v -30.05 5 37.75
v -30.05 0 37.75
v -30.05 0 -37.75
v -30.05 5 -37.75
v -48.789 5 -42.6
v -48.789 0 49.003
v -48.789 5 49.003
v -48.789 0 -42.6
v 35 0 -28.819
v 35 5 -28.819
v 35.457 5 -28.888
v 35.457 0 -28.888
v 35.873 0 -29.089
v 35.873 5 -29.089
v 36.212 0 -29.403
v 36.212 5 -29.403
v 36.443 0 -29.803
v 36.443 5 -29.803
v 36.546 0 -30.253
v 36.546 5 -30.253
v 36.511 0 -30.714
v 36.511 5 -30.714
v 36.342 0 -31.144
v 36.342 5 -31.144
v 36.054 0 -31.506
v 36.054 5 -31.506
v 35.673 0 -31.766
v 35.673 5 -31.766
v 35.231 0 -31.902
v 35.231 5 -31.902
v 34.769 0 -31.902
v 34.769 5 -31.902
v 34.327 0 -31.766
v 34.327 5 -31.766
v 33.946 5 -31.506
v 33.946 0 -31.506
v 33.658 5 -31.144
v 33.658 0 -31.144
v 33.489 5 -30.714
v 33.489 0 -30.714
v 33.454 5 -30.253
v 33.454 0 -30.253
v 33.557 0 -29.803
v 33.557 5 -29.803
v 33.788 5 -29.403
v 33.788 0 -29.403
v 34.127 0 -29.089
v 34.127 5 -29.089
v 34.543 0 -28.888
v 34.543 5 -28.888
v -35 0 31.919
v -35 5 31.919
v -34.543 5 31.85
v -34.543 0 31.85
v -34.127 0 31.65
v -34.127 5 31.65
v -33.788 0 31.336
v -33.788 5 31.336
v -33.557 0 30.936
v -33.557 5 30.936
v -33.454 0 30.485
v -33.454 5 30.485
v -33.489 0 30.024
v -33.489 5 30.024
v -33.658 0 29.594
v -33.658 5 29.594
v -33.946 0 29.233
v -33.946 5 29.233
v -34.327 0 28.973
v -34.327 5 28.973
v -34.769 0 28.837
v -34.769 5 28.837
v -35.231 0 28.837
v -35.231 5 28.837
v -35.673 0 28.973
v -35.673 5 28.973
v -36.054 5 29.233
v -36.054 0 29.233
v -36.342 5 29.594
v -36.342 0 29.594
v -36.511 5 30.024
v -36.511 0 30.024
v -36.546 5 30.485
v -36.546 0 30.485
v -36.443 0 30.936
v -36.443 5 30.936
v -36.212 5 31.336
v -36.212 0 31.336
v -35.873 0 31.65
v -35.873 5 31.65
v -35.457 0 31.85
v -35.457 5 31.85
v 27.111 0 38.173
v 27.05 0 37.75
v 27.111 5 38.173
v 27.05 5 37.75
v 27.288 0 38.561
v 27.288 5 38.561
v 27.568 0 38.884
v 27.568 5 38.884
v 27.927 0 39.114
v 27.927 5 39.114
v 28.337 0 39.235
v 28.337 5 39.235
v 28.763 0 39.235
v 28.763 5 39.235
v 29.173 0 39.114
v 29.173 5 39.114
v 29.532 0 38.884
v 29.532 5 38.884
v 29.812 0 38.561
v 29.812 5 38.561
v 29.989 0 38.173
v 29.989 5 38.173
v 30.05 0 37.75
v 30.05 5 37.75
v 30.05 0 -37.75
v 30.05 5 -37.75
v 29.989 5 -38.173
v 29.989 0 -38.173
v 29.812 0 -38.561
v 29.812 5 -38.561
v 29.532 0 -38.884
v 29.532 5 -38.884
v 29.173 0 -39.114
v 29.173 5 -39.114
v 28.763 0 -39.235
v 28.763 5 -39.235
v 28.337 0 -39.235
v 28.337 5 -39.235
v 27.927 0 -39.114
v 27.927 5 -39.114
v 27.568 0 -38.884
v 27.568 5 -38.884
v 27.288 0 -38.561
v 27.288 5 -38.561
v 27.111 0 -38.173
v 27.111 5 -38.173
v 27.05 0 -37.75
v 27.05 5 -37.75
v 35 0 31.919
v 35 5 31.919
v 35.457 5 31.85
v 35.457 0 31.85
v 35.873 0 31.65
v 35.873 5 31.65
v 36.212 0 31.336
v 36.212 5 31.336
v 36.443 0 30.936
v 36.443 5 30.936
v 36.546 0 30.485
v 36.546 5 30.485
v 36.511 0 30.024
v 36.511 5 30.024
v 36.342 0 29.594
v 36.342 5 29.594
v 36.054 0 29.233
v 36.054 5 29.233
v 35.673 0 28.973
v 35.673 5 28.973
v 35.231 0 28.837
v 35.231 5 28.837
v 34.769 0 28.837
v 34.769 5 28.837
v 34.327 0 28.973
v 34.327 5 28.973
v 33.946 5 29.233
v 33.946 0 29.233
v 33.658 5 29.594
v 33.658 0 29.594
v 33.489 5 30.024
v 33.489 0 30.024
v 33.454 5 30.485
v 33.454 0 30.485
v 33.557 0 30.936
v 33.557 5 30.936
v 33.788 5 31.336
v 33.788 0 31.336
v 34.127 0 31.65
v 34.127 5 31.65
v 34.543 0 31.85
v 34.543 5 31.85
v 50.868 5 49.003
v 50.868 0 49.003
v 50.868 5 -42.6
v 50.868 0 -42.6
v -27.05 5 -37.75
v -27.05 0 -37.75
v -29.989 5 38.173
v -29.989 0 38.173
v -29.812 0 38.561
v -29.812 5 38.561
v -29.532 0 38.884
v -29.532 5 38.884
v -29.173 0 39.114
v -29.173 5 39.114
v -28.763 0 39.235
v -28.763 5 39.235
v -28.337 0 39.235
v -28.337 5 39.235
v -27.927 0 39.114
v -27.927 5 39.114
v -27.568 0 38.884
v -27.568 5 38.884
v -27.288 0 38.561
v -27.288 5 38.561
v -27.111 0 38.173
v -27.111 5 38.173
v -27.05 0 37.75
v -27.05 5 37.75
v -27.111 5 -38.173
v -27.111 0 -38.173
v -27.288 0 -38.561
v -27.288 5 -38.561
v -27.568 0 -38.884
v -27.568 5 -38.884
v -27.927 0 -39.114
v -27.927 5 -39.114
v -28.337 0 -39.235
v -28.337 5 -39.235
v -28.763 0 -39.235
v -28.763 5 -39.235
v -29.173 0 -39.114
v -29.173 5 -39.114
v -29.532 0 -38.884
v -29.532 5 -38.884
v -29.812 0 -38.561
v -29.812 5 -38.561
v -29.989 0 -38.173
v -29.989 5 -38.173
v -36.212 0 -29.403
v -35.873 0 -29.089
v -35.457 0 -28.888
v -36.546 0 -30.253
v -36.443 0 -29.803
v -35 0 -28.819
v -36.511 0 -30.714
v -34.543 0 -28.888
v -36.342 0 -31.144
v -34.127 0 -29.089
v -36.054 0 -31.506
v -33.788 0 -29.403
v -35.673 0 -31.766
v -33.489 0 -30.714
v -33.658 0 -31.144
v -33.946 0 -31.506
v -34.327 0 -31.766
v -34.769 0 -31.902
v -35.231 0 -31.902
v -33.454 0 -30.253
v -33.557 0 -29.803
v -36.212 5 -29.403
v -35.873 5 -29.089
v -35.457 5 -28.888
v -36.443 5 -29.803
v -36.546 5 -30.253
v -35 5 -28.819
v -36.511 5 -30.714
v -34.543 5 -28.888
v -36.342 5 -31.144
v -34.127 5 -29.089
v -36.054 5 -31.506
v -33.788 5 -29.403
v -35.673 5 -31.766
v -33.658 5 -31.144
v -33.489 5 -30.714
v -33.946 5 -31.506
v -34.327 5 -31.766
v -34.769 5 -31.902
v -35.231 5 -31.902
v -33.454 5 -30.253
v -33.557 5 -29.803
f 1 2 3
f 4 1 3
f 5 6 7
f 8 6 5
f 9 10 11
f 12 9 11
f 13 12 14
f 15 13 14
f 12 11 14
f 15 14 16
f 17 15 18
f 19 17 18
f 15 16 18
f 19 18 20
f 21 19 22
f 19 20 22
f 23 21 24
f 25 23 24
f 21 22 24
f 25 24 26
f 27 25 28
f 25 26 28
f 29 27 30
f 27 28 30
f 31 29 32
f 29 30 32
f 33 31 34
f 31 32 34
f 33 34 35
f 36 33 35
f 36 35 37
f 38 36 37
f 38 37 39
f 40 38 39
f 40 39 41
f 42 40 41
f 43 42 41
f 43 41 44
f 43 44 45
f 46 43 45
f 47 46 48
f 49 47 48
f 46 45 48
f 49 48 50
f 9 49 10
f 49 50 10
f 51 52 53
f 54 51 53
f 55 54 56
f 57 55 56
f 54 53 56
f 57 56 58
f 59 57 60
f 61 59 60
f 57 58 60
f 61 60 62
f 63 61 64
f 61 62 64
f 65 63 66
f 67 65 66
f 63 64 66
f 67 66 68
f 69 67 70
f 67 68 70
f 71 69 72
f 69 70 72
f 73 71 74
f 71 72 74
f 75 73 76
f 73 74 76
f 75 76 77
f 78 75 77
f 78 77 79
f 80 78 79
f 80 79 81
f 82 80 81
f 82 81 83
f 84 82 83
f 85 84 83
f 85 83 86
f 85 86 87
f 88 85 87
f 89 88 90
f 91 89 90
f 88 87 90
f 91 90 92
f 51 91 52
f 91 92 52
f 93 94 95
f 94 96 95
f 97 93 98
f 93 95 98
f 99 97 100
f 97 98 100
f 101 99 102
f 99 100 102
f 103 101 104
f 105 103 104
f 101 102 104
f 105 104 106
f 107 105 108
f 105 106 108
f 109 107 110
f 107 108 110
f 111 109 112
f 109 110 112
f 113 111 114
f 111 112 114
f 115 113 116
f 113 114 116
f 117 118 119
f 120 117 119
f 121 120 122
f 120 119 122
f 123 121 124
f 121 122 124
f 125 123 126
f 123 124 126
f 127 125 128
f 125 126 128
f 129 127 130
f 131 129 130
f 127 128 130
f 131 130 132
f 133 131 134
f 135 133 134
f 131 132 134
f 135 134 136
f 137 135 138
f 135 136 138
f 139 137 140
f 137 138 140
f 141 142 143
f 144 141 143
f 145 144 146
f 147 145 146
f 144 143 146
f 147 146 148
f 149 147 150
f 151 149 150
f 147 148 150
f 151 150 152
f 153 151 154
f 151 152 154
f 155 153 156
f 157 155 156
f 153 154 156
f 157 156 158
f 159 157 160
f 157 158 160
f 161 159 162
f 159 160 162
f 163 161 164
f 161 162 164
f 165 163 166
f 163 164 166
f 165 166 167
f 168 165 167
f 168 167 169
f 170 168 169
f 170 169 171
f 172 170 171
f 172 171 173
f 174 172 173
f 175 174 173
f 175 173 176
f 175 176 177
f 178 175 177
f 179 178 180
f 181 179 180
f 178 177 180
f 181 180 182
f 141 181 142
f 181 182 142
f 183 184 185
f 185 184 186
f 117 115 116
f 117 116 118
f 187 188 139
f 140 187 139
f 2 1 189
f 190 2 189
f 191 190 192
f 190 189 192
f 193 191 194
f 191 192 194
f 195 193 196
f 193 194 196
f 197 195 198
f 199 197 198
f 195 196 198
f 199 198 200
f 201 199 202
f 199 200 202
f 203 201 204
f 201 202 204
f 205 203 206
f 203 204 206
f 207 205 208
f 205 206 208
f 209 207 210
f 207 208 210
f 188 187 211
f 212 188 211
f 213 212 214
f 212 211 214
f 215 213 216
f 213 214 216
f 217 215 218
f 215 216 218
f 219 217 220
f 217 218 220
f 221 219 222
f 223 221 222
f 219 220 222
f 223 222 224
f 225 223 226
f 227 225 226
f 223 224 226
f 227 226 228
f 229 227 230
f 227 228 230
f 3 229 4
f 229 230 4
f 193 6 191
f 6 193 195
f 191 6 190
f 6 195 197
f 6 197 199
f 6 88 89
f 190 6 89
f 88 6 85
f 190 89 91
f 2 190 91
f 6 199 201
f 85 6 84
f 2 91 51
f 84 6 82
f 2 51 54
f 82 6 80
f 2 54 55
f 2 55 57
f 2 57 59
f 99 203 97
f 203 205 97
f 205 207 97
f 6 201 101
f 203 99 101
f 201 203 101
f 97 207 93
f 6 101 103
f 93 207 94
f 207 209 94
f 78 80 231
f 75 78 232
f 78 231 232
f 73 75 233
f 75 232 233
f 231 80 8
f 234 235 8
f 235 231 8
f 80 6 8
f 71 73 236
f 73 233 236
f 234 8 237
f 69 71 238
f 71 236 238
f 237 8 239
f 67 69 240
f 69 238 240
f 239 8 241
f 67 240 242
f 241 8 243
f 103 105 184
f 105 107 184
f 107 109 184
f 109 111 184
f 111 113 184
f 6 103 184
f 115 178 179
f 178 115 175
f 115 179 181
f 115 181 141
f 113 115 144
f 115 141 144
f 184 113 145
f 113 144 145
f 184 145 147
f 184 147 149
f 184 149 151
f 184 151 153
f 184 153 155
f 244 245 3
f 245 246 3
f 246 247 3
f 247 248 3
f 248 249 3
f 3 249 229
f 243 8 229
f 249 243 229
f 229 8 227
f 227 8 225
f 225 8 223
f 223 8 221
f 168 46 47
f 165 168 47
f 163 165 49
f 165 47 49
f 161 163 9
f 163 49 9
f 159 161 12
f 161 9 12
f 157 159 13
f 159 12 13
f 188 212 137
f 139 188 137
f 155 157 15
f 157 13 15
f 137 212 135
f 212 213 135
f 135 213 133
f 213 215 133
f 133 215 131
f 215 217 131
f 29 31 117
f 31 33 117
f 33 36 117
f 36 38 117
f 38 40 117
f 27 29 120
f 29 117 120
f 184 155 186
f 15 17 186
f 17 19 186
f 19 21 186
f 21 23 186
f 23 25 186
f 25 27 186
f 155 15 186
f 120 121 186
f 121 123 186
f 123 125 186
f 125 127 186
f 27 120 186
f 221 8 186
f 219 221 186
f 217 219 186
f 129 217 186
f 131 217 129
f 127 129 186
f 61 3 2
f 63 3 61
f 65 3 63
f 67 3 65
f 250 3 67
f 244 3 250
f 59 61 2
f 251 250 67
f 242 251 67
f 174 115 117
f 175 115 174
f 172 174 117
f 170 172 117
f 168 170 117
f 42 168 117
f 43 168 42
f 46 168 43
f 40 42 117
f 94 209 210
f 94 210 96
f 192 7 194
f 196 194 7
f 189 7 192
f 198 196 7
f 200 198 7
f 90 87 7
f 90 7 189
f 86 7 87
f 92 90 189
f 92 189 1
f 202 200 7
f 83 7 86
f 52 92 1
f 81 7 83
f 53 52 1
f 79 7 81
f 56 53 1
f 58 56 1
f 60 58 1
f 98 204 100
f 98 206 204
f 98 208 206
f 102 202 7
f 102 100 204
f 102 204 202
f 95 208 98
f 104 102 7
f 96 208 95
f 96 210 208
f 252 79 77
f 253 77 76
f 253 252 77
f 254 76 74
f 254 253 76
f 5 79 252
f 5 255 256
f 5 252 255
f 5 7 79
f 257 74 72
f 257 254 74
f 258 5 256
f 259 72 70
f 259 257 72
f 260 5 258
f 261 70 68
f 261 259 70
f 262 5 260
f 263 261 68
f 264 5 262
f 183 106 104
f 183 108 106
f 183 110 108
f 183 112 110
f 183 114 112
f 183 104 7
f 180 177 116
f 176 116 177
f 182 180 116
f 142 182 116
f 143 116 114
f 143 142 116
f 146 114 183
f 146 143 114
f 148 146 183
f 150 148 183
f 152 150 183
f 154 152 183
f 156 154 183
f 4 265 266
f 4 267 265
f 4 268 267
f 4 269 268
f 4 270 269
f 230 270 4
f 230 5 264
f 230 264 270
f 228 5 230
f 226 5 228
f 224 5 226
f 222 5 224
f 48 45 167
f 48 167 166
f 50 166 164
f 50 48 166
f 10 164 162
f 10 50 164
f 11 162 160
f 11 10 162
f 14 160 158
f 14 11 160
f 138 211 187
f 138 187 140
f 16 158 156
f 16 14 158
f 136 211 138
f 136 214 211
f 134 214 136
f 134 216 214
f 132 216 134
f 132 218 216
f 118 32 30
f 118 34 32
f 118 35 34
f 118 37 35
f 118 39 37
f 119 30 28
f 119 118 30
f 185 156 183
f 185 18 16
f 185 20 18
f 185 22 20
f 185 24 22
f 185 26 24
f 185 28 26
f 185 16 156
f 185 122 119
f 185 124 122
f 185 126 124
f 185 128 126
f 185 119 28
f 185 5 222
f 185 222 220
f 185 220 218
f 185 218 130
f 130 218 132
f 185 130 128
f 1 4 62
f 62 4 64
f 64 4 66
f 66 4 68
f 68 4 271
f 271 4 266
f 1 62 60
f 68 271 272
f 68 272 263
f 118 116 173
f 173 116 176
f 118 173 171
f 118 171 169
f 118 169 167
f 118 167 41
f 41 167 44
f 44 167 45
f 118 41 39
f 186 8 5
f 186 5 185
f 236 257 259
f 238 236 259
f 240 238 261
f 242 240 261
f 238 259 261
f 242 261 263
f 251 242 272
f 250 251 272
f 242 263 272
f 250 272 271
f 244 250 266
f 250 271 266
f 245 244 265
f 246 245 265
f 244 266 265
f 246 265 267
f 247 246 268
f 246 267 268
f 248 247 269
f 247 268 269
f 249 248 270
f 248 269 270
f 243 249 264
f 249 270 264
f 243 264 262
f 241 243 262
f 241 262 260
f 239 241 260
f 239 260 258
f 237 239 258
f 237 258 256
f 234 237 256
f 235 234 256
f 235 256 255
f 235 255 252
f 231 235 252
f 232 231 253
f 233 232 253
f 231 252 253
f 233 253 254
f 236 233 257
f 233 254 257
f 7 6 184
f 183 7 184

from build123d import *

# Parameters (mm, degrees)
SKETCH_1_W          = 99.656546146
SKETCH_1_H          = 91.603491912
SKETCH_1_W_2        = 60.1
SKETCH_1_H_2        = 75.5
EXTRUDE_1_DEPTH     = 5
SKETCH_2_R          = 1.55
CUT_EXTRUDE_1_DEPTH = 5
SKETCH_3_R          = 1.5
CUT_EXTRUDE_2_DEPTH = 5


with BuildPart() as part:
    # 草图1 → 凸台-拉伸1 (new body)
    with BuildSketch(Plane(origin=(0, 0, 0), x_dir=(1, 0, 0), z_dir=(0, 1, 0))):
        with Locations((1.039363494, -3.201523692)):
            Rectangle(SKETCH_1_W, SKETCH_1_H)
        Rectangle(SKETCH_1_W_2, SKETCH_1_H_2, mode=Mode.SUBTRACT)
    extrude(amount=EXTRUDE_1_DEPTH)

    # 草图2 → 切除-拉伸1 (cut)
    with BuildSketch(Plane(origin=(0, 5, 0), x_dir=(1, 0, 0), z_dir=(0, 1, 0))):
        with Locations(Location((35, 30.369317712, 0), (0, 0, 270))):
            Circle(SKETCH_2_R)
        with Locations(Location((35, -30.369317712, 0), (0, 0, 270))):
            Circle(SKETCH_2_R)
        with Locations(Location((-35, -30.369317712, 0), (0, 0, 270))):
            Circle(SKETCH_2_R)
        with Locations(Location((-35, 30.369317712, 0), (0, 0, 270))):
            Circle(SKETCH_2_R)
    extrude(amount=-CUT_EXTRUDE_1_DEPTH, mode=Mode.SUBTRACT)

    # 草图3 → 切除-拉伸2 (cut)
    with BuildSketch(Plane(origin=(0, 5, 0), x_dir=(1, 0, 0), z_dir=(0, 1, 0))):
        with Locations((28.55, -37.75)):
            Circle(SKETCH_3_R)
        with Locations((28.55, 37.75)):
            Circle(SKETCH_3_R)
        with Locations((-28.55, 37.75)):
            Circle(SKETCH_3_R)
        with Locations((-28.55, -37.75)):
            Circle(SKETCH_3_R)
    extrude(amount=-CUT_EXTRUDE_2_DEPTH, mode=Mode.SUBTRACT)


solid = part.part
